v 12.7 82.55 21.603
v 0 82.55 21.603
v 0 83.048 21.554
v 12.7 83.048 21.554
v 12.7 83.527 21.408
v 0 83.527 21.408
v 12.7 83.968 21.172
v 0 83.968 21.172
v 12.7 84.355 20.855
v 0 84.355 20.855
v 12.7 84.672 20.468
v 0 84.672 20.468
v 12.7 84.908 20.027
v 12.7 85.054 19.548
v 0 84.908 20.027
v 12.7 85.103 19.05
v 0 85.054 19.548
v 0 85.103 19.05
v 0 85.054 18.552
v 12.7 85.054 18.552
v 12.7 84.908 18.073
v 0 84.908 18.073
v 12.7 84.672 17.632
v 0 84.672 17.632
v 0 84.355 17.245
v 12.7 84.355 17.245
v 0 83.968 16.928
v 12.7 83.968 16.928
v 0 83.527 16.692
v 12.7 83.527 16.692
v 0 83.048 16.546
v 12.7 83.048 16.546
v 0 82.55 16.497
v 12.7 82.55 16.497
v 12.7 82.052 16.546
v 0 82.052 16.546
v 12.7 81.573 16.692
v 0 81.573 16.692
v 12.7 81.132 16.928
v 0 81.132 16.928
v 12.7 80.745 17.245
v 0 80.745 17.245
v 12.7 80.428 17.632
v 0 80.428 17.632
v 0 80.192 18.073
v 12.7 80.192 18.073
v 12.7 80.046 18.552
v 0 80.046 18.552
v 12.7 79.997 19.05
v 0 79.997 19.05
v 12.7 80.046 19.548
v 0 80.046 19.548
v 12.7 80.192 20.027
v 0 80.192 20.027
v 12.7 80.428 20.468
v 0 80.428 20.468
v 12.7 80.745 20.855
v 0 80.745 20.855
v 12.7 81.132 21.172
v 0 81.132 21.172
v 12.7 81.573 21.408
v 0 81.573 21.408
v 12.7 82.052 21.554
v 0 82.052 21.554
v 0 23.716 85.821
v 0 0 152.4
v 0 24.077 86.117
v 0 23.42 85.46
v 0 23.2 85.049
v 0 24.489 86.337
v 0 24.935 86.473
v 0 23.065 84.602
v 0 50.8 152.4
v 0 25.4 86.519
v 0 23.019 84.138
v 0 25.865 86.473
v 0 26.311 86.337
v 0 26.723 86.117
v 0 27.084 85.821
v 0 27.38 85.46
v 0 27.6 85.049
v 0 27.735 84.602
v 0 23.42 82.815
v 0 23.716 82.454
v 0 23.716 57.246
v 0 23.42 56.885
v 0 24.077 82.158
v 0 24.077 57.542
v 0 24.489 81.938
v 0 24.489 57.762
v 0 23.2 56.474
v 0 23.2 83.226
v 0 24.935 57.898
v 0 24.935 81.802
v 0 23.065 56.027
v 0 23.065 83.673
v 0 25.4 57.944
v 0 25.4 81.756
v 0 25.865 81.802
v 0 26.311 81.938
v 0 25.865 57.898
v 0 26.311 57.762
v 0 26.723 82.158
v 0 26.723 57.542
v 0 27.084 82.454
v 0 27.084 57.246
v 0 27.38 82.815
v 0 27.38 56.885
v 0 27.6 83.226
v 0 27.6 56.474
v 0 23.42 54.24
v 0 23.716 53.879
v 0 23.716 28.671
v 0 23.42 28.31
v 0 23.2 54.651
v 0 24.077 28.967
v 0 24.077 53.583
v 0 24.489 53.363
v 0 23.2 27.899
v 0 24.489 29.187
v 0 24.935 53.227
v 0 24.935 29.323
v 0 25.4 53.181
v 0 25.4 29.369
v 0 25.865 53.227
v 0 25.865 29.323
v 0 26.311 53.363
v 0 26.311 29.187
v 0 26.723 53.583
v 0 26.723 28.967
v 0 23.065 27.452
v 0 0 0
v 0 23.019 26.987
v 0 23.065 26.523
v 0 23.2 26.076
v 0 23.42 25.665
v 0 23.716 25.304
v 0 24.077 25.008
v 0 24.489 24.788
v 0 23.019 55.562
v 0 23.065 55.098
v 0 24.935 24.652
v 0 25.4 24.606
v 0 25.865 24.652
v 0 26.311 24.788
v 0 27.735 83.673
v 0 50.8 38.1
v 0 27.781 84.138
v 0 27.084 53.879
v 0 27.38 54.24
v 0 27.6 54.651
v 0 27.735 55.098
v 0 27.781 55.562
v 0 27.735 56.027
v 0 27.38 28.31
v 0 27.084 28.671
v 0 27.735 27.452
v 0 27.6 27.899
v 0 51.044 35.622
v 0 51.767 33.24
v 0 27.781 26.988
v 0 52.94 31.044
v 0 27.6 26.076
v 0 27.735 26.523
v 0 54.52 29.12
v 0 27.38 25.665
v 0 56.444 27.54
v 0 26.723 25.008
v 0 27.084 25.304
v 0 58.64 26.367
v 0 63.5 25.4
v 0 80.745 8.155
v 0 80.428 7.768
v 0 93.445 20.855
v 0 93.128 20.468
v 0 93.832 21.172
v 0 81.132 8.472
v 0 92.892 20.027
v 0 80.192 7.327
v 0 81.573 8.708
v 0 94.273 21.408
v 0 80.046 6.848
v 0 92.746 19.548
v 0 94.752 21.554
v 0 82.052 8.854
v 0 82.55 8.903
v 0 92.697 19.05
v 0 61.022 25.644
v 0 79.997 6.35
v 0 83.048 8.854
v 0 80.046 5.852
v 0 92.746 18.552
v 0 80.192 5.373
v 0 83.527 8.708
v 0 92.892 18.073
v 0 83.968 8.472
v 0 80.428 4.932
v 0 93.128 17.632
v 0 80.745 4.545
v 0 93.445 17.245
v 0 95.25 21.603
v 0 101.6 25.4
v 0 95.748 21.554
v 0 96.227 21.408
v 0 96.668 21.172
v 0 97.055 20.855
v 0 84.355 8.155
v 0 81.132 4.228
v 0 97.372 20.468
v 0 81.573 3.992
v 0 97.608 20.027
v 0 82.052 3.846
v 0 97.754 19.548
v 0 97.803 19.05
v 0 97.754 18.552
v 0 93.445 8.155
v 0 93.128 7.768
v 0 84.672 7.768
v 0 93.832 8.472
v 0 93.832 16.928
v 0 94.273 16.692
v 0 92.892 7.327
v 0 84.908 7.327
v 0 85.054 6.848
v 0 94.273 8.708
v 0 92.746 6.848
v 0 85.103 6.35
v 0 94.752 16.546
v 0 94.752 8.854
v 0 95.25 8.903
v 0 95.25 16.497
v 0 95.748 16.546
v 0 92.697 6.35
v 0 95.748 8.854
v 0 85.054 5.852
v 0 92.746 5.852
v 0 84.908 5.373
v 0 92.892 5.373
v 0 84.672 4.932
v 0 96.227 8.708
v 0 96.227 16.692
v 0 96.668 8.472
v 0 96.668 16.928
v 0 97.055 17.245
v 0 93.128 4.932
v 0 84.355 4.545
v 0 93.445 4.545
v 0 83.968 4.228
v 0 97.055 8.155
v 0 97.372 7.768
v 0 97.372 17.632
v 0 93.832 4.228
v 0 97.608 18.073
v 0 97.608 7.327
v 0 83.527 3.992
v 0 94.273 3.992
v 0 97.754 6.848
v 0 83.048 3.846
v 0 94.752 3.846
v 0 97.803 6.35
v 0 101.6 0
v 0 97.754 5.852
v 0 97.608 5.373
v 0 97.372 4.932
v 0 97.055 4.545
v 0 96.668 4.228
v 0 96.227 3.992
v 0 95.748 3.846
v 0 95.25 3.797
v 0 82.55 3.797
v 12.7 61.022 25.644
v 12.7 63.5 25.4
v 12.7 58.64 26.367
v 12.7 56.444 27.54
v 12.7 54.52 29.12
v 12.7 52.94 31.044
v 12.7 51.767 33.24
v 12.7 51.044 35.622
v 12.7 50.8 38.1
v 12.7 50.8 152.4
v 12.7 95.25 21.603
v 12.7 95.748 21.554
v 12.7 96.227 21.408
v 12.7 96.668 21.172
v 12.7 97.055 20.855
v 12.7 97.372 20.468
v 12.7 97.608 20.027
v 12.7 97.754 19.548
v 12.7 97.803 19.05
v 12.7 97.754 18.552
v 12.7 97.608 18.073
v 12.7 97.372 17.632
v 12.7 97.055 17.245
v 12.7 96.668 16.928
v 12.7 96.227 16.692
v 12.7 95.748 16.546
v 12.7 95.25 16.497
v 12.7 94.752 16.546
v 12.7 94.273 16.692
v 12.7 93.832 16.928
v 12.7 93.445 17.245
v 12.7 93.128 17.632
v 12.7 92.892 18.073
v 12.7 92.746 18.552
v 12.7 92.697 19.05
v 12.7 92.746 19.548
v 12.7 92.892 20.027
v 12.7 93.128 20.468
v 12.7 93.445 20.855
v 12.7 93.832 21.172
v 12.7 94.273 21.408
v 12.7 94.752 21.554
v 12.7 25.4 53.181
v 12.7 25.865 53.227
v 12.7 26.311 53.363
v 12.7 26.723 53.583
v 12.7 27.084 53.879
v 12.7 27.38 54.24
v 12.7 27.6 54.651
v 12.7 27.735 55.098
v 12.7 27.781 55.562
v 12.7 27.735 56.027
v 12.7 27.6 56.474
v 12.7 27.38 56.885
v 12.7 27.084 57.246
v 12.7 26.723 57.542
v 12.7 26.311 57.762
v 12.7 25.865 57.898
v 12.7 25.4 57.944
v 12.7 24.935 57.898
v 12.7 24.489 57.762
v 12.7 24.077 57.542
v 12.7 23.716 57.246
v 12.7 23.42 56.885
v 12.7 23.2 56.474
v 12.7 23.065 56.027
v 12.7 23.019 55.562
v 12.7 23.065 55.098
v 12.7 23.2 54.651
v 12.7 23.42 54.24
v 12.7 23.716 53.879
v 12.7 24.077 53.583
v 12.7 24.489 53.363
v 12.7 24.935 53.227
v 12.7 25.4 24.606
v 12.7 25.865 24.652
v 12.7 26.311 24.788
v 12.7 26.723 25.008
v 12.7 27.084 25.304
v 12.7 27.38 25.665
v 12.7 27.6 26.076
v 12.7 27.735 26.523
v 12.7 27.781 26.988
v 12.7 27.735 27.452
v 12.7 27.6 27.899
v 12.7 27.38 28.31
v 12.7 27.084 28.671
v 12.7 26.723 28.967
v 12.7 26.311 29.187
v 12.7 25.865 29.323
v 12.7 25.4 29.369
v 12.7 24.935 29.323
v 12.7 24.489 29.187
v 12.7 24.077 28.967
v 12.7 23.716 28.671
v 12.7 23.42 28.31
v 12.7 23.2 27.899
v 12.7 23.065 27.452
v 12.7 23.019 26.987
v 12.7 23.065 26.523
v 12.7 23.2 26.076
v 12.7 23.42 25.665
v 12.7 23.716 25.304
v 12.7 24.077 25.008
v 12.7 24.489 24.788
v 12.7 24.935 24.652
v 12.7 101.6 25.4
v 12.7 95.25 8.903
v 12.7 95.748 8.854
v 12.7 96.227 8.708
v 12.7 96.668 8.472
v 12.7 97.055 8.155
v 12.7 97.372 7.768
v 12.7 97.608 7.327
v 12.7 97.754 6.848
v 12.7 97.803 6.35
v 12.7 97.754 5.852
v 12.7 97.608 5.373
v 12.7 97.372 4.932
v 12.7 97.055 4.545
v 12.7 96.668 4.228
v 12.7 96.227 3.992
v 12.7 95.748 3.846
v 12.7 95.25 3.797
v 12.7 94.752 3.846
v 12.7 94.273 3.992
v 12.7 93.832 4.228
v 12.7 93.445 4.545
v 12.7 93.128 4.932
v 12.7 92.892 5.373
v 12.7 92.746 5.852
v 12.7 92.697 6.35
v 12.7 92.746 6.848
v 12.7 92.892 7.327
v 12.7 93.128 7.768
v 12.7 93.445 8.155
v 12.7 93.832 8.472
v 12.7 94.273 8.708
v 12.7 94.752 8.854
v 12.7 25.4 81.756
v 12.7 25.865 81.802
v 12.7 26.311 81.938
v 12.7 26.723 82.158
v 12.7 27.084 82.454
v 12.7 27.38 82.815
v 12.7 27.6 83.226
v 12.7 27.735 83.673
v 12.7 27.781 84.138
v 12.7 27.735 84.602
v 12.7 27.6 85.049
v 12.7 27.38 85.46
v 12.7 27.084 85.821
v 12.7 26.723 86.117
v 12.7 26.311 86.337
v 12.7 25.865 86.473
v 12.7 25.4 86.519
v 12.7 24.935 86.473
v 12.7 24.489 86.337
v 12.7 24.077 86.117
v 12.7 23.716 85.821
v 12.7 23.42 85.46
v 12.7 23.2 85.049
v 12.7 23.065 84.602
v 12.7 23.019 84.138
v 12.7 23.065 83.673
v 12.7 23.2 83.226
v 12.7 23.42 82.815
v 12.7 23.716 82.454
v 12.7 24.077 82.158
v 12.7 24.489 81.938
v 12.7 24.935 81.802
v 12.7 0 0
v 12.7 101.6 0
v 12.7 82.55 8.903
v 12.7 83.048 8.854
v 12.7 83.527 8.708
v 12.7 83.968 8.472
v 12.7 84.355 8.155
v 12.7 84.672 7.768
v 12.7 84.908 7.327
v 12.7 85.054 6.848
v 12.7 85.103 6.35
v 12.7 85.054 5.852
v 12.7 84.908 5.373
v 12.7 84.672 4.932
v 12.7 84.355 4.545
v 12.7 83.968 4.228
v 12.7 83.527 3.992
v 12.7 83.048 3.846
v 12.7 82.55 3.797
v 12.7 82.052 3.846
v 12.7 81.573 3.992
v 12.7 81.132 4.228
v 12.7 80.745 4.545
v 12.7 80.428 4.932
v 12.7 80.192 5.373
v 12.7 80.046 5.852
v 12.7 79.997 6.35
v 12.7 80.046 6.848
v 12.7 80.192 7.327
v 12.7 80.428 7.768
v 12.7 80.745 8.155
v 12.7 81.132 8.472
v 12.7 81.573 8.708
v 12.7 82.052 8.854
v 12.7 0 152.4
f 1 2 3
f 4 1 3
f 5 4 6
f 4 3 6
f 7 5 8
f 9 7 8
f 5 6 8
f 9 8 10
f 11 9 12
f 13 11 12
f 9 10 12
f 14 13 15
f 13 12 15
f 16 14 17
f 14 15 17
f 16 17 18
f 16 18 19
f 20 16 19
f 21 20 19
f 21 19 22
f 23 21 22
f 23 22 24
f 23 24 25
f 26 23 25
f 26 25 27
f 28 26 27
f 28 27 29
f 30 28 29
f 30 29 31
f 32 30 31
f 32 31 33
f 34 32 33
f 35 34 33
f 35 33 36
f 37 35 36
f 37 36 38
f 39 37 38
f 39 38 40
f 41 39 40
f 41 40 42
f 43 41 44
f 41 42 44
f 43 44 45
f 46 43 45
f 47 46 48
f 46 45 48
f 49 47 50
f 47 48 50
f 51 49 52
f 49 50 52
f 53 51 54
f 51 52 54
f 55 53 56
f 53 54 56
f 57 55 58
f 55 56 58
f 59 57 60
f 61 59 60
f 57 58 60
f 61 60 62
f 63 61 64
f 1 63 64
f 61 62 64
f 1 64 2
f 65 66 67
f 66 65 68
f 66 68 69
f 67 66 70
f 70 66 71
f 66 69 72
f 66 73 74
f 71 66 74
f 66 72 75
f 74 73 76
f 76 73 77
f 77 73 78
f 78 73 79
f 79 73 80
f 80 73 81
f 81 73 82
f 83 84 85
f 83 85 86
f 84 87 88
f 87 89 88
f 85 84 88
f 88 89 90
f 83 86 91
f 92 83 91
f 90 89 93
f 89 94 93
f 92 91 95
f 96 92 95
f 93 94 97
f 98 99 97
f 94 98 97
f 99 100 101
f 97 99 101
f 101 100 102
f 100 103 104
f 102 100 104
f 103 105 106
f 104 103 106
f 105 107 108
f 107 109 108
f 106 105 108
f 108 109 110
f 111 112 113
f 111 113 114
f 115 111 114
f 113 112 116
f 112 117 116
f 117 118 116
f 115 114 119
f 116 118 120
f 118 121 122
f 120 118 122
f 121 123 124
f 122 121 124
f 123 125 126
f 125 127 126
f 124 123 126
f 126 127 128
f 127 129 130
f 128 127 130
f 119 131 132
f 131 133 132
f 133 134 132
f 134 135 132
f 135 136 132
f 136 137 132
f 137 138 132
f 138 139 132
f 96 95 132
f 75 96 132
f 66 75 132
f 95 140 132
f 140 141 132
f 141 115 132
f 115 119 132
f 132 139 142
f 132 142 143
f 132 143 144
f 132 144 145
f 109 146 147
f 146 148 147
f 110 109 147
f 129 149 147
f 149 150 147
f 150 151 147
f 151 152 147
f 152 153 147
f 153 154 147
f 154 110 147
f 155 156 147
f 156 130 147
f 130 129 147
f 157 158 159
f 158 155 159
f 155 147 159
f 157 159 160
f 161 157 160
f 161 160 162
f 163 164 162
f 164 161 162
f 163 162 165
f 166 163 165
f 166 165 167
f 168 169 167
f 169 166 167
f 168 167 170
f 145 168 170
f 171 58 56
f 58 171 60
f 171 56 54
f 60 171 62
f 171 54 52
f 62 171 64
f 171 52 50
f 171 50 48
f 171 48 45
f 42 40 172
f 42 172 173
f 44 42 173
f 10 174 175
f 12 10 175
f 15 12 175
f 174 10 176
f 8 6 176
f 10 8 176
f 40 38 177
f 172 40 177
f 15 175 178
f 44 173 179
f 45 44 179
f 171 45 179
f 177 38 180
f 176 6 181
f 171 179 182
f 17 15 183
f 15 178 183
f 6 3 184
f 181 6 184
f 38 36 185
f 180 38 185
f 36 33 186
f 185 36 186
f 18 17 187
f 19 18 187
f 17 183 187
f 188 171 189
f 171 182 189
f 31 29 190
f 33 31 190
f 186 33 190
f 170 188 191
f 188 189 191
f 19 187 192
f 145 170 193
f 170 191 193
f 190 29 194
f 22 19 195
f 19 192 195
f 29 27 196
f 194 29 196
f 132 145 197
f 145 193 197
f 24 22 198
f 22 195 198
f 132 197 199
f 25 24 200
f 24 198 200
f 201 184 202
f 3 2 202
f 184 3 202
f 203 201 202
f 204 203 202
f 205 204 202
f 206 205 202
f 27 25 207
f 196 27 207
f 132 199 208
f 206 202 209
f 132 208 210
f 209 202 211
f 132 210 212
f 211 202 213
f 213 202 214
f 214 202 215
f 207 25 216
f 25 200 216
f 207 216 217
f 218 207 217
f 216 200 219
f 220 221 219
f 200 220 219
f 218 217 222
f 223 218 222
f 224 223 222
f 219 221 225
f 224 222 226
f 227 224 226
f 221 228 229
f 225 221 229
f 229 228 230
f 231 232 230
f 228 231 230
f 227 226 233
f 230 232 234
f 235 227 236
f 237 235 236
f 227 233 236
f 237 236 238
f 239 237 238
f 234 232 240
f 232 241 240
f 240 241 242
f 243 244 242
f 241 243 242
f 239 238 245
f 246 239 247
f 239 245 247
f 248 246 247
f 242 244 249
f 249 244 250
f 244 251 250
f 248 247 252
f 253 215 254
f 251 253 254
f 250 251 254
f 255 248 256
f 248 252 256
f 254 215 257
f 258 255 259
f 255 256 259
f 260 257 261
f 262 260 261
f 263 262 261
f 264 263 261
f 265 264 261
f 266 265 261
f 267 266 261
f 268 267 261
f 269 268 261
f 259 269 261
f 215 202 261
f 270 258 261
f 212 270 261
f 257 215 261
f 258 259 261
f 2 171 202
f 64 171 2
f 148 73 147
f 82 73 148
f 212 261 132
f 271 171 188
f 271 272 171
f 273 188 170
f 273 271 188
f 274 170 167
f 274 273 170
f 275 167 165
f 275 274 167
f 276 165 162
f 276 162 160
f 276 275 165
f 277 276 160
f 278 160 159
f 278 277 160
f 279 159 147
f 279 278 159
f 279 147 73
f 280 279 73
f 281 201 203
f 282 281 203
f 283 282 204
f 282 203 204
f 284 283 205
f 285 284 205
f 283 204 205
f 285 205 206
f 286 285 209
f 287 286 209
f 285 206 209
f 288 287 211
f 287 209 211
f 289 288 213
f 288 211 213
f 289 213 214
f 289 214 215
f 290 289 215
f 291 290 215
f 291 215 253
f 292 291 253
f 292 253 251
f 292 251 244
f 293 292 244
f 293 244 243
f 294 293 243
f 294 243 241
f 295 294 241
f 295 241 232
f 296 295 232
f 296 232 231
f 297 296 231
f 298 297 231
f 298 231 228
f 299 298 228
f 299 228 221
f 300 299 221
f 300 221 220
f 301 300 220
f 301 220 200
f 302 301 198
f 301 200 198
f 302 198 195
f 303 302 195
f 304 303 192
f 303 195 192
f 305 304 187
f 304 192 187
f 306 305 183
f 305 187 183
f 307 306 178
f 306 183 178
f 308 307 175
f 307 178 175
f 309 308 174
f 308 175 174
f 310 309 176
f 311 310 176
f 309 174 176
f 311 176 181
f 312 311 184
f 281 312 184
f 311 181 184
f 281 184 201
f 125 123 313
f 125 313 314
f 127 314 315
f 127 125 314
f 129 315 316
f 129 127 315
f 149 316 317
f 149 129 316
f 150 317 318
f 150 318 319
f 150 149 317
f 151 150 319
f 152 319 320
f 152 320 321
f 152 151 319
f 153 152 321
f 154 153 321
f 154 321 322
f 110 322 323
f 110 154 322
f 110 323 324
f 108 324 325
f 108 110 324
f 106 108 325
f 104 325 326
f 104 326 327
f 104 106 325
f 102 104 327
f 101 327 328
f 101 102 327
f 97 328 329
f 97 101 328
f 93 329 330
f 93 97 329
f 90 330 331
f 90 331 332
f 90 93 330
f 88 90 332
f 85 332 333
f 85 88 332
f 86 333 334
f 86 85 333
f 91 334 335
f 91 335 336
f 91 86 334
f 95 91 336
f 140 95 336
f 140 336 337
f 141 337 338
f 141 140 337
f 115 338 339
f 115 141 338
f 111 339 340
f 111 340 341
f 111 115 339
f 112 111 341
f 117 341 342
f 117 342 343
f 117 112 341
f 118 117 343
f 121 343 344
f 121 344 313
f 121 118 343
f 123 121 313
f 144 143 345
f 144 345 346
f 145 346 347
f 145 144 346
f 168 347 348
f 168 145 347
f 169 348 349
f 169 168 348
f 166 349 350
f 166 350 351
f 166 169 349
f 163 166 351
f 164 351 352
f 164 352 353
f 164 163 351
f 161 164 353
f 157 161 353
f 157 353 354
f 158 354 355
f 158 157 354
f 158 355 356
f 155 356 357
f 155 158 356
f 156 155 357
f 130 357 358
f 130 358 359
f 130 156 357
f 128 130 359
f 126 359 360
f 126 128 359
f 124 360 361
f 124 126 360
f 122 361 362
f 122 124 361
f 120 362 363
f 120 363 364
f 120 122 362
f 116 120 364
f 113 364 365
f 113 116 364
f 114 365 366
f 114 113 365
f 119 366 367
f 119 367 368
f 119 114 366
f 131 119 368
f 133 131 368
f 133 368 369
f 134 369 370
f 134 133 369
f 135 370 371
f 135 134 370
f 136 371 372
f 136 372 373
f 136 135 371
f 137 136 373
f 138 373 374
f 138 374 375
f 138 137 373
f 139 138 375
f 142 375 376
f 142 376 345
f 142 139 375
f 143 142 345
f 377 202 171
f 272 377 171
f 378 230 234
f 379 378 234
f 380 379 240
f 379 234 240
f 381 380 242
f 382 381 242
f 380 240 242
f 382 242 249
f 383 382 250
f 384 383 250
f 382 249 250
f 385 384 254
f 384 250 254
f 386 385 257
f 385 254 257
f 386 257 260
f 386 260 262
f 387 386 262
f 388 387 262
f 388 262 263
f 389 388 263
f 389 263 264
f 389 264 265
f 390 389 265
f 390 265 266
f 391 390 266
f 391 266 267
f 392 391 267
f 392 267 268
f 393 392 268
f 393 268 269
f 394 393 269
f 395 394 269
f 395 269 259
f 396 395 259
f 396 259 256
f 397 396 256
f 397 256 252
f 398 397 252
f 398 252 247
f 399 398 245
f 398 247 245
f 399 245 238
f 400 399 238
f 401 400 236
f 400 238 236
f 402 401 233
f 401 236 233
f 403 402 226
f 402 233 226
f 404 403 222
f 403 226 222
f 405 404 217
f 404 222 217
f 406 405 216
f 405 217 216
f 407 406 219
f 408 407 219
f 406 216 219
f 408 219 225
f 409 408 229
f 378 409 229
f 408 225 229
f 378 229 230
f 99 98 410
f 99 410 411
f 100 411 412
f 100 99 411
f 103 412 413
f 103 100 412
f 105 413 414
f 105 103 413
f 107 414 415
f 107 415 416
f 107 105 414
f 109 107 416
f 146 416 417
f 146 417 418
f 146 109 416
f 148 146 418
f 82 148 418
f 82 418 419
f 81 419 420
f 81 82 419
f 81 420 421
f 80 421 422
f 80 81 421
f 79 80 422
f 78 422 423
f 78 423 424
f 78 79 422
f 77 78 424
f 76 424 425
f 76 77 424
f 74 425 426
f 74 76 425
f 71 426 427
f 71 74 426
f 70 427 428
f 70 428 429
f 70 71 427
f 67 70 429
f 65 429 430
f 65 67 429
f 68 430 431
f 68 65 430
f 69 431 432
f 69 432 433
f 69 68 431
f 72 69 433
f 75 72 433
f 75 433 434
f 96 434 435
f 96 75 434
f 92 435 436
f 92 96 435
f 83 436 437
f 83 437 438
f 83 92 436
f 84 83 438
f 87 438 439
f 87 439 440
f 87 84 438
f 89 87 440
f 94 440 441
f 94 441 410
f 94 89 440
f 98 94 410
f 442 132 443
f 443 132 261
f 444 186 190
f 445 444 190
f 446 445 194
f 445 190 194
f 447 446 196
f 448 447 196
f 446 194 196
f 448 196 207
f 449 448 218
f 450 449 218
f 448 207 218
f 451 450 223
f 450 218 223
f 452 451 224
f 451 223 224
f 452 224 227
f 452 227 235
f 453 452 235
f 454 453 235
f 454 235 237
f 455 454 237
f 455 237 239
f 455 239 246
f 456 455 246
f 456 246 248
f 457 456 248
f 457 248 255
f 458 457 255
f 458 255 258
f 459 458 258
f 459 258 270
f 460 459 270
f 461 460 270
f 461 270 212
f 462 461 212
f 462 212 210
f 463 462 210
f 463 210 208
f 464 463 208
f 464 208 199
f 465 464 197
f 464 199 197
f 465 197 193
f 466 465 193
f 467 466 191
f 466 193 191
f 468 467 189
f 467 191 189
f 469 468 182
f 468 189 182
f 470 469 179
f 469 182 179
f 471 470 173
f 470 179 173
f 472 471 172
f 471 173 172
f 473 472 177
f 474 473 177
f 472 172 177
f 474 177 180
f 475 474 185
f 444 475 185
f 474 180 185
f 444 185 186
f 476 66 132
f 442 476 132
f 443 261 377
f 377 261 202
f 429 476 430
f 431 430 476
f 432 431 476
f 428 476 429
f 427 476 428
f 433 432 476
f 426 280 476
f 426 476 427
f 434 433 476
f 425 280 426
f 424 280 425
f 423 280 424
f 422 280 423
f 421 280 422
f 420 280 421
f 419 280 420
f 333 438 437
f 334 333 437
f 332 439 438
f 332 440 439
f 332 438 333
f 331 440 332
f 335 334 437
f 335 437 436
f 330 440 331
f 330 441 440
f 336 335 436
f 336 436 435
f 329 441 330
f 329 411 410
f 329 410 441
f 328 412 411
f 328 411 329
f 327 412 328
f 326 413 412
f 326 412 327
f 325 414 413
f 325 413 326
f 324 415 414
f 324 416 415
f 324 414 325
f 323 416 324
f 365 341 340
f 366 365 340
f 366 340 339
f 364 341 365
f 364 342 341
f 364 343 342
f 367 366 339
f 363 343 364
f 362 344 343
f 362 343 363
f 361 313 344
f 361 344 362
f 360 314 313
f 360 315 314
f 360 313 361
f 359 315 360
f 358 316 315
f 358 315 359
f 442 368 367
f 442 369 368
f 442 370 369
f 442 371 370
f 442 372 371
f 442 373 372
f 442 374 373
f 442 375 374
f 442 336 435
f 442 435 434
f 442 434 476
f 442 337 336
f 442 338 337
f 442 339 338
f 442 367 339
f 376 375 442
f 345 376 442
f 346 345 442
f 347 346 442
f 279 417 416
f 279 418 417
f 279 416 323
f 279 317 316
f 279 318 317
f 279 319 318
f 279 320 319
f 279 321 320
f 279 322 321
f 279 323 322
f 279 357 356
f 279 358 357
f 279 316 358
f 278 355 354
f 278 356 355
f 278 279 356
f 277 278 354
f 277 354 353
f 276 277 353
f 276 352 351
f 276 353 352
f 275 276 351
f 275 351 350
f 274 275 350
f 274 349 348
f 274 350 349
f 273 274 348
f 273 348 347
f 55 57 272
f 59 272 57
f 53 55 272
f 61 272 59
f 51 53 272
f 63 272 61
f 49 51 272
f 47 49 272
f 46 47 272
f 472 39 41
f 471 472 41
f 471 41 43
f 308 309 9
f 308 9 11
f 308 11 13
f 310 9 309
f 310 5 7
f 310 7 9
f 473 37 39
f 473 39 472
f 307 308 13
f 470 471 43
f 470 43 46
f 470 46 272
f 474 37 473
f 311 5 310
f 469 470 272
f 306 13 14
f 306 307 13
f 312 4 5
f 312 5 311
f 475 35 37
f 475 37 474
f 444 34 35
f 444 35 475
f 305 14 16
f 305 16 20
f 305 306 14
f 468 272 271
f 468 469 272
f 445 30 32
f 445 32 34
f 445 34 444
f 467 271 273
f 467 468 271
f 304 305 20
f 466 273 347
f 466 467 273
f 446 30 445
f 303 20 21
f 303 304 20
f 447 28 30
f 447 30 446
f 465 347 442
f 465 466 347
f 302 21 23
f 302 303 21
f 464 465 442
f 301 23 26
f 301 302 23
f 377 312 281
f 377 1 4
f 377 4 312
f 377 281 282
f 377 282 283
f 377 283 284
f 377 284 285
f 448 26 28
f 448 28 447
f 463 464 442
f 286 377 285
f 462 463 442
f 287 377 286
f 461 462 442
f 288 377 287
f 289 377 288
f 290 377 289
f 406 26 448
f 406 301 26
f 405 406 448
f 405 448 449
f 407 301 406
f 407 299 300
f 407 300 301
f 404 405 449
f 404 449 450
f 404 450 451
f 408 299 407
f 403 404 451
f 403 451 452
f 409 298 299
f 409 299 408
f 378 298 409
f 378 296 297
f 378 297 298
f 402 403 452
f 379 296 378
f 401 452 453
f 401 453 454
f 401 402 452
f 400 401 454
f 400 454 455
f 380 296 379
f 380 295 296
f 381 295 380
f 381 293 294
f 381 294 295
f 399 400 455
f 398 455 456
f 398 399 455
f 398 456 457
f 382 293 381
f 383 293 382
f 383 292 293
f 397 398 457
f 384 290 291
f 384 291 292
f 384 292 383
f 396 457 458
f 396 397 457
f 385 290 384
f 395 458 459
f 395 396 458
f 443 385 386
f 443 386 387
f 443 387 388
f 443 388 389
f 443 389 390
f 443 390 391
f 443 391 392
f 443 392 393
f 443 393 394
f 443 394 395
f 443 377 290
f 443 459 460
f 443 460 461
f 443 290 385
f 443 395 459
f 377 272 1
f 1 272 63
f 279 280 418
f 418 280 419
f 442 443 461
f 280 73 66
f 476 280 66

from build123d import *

# Parameters (mm, degrees)
SKETCH1_R              = 2.38125
BOSS_EXTRUDE1_DEPTH    = 12.7
F_10_CLEARANCE_HOLE1_D = 5.1054
FILLET1_R              = 12.7


with BuildPart() as part:
    # Sketch1 → Boss-Extrude1 (new body)
    with BuildSketch(Plane(origin=(0, 0, 0), x_dir=(0, 0, -1), z_dir=(1, 0, 0))):
        Polygon((0, 0), (0, 101.6), (-25.4, 101.6), (-25.4, 50.8), (-152.4, 50.8), (-152.4, 0), align=None)
        with Locations((-84.1375, 25.4)):
            Circle(SKETCH1_R, mode=Mode.SUBTRACT)
        with Locations((-55.5625, 25.4)):
            Circle(SKETCH1_R, mode=Mode.SUBTRACT)
        with Locations((-26.9875, 25.4)):
            Circle(SKETCH1_R, mode=Mode.SUBTRACT)
    extrude(amount=BOSS_EXTRUDE1_DEPTH)

    # #10 Clearance Hole1 (through all)
    with Locations(Plane(origin=(12.7, 0, 0), x_dir=(0, 0, -1), z_dir=(1, 0, 0))):
        with Locations((-19.05, 95.25), (-6.35, 95.25), (-6.35, 82.55), (-19.05, 82.55)):
            Hole(F_10_CLEARANCE_HOLE1_D / 2)

    # Fillet1
    fillet1_edges = [part.edges().sort_by_distance(p)[0] for p in [
        (6.35, 50.8, 25.4),
    ]]
    fillet(fillet1_edges, radius=FILLET1_R)


solid = part.part
